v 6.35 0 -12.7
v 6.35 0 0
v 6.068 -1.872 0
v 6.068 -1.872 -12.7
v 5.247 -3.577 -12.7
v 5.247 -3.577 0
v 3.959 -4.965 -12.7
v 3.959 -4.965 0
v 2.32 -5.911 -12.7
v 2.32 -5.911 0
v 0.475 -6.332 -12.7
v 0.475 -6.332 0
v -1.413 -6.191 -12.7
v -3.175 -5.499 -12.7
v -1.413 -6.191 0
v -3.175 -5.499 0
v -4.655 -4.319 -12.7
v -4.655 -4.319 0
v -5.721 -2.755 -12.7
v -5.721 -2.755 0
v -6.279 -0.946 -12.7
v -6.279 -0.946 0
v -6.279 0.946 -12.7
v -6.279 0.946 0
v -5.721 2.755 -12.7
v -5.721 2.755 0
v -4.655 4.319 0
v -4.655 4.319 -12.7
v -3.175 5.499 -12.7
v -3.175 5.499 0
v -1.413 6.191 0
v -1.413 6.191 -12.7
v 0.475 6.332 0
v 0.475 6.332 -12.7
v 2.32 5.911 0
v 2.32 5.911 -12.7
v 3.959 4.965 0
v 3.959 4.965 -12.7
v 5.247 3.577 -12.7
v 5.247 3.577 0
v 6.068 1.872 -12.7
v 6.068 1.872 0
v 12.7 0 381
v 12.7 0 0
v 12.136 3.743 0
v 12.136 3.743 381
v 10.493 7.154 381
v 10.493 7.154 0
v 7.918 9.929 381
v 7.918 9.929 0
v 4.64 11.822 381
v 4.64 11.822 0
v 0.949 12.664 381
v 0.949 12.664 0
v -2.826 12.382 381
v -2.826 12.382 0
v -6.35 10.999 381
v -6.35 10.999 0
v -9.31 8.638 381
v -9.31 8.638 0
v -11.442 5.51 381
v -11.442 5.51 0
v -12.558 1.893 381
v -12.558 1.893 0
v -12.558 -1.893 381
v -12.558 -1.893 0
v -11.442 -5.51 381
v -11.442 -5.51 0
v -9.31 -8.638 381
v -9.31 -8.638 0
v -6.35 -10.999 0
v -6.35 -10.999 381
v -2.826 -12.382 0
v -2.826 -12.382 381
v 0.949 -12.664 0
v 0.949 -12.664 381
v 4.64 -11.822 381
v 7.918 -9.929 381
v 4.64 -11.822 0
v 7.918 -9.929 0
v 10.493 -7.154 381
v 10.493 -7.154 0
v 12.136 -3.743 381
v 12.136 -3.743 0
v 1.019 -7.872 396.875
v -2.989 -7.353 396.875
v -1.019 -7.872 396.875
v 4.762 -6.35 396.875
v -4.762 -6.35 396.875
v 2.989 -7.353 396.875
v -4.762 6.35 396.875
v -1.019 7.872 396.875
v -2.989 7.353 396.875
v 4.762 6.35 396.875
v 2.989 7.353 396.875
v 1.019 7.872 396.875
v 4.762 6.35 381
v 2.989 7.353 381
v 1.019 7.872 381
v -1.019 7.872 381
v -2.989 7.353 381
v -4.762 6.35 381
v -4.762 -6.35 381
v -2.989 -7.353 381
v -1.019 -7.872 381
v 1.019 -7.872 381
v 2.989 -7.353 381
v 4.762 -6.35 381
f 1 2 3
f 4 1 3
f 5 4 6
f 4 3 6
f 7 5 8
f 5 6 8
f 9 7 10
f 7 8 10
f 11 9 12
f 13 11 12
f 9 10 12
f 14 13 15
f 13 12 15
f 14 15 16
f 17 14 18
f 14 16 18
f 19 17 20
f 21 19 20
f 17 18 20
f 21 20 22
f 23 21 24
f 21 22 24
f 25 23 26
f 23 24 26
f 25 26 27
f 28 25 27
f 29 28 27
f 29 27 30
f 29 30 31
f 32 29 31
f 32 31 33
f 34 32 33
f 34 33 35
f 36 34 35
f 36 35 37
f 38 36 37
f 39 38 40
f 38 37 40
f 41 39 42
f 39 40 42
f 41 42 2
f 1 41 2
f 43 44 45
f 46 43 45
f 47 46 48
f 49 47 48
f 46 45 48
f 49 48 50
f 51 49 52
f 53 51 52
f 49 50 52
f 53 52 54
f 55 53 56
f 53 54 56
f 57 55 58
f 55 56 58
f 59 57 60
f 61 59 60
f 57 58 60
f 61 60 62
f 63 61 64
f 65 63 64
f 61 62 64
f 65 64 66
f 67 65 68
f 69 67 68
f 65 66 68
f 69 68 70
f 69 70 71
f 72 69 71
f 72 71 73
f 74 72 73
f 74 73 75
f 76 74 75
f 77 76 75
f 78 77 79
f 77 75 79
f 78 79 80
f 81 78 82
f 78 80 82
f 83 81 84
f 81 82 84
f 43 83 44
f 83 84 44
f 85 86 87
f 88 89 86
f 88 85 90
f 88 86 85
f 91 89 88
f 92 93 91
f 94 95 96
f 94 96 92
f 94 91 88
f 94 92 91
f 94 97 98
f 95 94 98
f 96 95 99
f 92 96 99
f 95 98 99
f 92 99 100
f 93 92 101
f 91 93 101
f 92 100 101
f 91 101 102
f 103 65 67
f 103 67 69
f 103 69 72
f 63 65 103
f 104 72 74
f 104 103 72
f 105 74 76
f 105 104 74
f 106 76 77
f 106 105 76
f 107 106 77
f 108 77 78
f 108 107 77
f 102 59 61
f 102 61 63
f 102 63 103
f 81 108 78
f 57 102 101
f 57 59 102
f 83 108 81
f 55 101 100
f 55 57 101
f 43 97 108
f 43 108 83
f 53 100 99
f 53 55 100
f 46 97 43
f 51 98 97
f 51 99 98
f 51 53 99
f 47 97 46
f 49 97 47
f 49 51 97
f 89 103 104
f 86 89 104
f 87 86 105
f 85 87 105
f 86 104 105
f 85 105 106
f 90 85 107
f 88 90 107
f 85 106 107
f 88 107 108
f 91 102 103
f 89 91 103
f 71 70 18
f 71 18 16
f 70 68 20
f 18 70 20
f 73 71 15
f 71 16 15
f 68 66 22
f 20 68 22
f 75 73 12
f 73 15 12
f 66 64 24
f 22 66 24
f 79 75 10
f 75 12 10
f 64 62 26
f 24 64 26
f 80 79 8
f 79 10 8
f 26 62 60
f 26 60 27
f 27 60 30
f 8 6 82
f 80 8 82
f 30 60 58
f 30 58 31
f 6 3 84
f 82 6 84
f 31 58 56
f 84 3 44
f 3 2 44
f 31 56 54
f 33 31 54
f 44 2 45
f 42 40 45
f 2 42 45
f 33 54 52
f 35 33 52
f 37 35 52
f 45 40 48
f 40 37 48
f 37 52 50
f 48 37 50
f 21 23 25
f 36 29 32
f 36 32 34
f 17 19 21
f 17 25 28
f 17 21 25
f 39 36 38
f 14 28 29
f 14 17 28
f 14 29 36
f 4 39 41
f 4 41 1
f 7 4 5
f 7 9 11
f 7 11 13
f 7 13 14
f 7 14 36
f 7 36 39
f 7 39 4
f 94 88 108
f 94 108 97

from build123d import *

# Parameters (mm, degrees)
F0_R     = 12.7
F1_DEPTH = 381
F3_DEPTH = 15.875
F4_R     = 6.35
F5_DEPTH = 12.7


with BuildPart() as f1:
    # F0 (on Top) → F1 (new body)
    with BuildSketch(Plane.XY):
        Circle(F0_R)
    extrude(amount=F1_DEPTH)

    # F2 (on face) → F3 (join)
    with BuildSketch(Plane.XY.offset(381)):
        with BuildLine():
            ThreePointArc((-4.7625, -6.35), (0, -7.9375), (4.7625, -6.35))
            Line((4.7625, -6.35), (-4.7625, -6.35))
        make_face()
        Polygon((4.7625, 0), (4.7625, 6.35), (-4.7625, 6.35), (-4.7625, 0), (-4.7625, -6.35), (4.7625, -6.35), align=None)
        with BuildLine():
            Line((-4.7625, 6.35), (4.7625, 6.35))
            ThreePointArc((4.7625, 6.35), (0, 7.9375), (-4.7625, 6.35))
        make_face()
    extrude(amount=F3_DEPTH)

    # F4 (on face) → F5 (join)
    with BuildSketch(Plane(origin=(0, 0, 0), x_dir=(1, 0, 0), z_dir=(0, 0, -1))):
        Circle(F4_R)
    extrude(amount=F5_DEPTH)


solid = f1.part
